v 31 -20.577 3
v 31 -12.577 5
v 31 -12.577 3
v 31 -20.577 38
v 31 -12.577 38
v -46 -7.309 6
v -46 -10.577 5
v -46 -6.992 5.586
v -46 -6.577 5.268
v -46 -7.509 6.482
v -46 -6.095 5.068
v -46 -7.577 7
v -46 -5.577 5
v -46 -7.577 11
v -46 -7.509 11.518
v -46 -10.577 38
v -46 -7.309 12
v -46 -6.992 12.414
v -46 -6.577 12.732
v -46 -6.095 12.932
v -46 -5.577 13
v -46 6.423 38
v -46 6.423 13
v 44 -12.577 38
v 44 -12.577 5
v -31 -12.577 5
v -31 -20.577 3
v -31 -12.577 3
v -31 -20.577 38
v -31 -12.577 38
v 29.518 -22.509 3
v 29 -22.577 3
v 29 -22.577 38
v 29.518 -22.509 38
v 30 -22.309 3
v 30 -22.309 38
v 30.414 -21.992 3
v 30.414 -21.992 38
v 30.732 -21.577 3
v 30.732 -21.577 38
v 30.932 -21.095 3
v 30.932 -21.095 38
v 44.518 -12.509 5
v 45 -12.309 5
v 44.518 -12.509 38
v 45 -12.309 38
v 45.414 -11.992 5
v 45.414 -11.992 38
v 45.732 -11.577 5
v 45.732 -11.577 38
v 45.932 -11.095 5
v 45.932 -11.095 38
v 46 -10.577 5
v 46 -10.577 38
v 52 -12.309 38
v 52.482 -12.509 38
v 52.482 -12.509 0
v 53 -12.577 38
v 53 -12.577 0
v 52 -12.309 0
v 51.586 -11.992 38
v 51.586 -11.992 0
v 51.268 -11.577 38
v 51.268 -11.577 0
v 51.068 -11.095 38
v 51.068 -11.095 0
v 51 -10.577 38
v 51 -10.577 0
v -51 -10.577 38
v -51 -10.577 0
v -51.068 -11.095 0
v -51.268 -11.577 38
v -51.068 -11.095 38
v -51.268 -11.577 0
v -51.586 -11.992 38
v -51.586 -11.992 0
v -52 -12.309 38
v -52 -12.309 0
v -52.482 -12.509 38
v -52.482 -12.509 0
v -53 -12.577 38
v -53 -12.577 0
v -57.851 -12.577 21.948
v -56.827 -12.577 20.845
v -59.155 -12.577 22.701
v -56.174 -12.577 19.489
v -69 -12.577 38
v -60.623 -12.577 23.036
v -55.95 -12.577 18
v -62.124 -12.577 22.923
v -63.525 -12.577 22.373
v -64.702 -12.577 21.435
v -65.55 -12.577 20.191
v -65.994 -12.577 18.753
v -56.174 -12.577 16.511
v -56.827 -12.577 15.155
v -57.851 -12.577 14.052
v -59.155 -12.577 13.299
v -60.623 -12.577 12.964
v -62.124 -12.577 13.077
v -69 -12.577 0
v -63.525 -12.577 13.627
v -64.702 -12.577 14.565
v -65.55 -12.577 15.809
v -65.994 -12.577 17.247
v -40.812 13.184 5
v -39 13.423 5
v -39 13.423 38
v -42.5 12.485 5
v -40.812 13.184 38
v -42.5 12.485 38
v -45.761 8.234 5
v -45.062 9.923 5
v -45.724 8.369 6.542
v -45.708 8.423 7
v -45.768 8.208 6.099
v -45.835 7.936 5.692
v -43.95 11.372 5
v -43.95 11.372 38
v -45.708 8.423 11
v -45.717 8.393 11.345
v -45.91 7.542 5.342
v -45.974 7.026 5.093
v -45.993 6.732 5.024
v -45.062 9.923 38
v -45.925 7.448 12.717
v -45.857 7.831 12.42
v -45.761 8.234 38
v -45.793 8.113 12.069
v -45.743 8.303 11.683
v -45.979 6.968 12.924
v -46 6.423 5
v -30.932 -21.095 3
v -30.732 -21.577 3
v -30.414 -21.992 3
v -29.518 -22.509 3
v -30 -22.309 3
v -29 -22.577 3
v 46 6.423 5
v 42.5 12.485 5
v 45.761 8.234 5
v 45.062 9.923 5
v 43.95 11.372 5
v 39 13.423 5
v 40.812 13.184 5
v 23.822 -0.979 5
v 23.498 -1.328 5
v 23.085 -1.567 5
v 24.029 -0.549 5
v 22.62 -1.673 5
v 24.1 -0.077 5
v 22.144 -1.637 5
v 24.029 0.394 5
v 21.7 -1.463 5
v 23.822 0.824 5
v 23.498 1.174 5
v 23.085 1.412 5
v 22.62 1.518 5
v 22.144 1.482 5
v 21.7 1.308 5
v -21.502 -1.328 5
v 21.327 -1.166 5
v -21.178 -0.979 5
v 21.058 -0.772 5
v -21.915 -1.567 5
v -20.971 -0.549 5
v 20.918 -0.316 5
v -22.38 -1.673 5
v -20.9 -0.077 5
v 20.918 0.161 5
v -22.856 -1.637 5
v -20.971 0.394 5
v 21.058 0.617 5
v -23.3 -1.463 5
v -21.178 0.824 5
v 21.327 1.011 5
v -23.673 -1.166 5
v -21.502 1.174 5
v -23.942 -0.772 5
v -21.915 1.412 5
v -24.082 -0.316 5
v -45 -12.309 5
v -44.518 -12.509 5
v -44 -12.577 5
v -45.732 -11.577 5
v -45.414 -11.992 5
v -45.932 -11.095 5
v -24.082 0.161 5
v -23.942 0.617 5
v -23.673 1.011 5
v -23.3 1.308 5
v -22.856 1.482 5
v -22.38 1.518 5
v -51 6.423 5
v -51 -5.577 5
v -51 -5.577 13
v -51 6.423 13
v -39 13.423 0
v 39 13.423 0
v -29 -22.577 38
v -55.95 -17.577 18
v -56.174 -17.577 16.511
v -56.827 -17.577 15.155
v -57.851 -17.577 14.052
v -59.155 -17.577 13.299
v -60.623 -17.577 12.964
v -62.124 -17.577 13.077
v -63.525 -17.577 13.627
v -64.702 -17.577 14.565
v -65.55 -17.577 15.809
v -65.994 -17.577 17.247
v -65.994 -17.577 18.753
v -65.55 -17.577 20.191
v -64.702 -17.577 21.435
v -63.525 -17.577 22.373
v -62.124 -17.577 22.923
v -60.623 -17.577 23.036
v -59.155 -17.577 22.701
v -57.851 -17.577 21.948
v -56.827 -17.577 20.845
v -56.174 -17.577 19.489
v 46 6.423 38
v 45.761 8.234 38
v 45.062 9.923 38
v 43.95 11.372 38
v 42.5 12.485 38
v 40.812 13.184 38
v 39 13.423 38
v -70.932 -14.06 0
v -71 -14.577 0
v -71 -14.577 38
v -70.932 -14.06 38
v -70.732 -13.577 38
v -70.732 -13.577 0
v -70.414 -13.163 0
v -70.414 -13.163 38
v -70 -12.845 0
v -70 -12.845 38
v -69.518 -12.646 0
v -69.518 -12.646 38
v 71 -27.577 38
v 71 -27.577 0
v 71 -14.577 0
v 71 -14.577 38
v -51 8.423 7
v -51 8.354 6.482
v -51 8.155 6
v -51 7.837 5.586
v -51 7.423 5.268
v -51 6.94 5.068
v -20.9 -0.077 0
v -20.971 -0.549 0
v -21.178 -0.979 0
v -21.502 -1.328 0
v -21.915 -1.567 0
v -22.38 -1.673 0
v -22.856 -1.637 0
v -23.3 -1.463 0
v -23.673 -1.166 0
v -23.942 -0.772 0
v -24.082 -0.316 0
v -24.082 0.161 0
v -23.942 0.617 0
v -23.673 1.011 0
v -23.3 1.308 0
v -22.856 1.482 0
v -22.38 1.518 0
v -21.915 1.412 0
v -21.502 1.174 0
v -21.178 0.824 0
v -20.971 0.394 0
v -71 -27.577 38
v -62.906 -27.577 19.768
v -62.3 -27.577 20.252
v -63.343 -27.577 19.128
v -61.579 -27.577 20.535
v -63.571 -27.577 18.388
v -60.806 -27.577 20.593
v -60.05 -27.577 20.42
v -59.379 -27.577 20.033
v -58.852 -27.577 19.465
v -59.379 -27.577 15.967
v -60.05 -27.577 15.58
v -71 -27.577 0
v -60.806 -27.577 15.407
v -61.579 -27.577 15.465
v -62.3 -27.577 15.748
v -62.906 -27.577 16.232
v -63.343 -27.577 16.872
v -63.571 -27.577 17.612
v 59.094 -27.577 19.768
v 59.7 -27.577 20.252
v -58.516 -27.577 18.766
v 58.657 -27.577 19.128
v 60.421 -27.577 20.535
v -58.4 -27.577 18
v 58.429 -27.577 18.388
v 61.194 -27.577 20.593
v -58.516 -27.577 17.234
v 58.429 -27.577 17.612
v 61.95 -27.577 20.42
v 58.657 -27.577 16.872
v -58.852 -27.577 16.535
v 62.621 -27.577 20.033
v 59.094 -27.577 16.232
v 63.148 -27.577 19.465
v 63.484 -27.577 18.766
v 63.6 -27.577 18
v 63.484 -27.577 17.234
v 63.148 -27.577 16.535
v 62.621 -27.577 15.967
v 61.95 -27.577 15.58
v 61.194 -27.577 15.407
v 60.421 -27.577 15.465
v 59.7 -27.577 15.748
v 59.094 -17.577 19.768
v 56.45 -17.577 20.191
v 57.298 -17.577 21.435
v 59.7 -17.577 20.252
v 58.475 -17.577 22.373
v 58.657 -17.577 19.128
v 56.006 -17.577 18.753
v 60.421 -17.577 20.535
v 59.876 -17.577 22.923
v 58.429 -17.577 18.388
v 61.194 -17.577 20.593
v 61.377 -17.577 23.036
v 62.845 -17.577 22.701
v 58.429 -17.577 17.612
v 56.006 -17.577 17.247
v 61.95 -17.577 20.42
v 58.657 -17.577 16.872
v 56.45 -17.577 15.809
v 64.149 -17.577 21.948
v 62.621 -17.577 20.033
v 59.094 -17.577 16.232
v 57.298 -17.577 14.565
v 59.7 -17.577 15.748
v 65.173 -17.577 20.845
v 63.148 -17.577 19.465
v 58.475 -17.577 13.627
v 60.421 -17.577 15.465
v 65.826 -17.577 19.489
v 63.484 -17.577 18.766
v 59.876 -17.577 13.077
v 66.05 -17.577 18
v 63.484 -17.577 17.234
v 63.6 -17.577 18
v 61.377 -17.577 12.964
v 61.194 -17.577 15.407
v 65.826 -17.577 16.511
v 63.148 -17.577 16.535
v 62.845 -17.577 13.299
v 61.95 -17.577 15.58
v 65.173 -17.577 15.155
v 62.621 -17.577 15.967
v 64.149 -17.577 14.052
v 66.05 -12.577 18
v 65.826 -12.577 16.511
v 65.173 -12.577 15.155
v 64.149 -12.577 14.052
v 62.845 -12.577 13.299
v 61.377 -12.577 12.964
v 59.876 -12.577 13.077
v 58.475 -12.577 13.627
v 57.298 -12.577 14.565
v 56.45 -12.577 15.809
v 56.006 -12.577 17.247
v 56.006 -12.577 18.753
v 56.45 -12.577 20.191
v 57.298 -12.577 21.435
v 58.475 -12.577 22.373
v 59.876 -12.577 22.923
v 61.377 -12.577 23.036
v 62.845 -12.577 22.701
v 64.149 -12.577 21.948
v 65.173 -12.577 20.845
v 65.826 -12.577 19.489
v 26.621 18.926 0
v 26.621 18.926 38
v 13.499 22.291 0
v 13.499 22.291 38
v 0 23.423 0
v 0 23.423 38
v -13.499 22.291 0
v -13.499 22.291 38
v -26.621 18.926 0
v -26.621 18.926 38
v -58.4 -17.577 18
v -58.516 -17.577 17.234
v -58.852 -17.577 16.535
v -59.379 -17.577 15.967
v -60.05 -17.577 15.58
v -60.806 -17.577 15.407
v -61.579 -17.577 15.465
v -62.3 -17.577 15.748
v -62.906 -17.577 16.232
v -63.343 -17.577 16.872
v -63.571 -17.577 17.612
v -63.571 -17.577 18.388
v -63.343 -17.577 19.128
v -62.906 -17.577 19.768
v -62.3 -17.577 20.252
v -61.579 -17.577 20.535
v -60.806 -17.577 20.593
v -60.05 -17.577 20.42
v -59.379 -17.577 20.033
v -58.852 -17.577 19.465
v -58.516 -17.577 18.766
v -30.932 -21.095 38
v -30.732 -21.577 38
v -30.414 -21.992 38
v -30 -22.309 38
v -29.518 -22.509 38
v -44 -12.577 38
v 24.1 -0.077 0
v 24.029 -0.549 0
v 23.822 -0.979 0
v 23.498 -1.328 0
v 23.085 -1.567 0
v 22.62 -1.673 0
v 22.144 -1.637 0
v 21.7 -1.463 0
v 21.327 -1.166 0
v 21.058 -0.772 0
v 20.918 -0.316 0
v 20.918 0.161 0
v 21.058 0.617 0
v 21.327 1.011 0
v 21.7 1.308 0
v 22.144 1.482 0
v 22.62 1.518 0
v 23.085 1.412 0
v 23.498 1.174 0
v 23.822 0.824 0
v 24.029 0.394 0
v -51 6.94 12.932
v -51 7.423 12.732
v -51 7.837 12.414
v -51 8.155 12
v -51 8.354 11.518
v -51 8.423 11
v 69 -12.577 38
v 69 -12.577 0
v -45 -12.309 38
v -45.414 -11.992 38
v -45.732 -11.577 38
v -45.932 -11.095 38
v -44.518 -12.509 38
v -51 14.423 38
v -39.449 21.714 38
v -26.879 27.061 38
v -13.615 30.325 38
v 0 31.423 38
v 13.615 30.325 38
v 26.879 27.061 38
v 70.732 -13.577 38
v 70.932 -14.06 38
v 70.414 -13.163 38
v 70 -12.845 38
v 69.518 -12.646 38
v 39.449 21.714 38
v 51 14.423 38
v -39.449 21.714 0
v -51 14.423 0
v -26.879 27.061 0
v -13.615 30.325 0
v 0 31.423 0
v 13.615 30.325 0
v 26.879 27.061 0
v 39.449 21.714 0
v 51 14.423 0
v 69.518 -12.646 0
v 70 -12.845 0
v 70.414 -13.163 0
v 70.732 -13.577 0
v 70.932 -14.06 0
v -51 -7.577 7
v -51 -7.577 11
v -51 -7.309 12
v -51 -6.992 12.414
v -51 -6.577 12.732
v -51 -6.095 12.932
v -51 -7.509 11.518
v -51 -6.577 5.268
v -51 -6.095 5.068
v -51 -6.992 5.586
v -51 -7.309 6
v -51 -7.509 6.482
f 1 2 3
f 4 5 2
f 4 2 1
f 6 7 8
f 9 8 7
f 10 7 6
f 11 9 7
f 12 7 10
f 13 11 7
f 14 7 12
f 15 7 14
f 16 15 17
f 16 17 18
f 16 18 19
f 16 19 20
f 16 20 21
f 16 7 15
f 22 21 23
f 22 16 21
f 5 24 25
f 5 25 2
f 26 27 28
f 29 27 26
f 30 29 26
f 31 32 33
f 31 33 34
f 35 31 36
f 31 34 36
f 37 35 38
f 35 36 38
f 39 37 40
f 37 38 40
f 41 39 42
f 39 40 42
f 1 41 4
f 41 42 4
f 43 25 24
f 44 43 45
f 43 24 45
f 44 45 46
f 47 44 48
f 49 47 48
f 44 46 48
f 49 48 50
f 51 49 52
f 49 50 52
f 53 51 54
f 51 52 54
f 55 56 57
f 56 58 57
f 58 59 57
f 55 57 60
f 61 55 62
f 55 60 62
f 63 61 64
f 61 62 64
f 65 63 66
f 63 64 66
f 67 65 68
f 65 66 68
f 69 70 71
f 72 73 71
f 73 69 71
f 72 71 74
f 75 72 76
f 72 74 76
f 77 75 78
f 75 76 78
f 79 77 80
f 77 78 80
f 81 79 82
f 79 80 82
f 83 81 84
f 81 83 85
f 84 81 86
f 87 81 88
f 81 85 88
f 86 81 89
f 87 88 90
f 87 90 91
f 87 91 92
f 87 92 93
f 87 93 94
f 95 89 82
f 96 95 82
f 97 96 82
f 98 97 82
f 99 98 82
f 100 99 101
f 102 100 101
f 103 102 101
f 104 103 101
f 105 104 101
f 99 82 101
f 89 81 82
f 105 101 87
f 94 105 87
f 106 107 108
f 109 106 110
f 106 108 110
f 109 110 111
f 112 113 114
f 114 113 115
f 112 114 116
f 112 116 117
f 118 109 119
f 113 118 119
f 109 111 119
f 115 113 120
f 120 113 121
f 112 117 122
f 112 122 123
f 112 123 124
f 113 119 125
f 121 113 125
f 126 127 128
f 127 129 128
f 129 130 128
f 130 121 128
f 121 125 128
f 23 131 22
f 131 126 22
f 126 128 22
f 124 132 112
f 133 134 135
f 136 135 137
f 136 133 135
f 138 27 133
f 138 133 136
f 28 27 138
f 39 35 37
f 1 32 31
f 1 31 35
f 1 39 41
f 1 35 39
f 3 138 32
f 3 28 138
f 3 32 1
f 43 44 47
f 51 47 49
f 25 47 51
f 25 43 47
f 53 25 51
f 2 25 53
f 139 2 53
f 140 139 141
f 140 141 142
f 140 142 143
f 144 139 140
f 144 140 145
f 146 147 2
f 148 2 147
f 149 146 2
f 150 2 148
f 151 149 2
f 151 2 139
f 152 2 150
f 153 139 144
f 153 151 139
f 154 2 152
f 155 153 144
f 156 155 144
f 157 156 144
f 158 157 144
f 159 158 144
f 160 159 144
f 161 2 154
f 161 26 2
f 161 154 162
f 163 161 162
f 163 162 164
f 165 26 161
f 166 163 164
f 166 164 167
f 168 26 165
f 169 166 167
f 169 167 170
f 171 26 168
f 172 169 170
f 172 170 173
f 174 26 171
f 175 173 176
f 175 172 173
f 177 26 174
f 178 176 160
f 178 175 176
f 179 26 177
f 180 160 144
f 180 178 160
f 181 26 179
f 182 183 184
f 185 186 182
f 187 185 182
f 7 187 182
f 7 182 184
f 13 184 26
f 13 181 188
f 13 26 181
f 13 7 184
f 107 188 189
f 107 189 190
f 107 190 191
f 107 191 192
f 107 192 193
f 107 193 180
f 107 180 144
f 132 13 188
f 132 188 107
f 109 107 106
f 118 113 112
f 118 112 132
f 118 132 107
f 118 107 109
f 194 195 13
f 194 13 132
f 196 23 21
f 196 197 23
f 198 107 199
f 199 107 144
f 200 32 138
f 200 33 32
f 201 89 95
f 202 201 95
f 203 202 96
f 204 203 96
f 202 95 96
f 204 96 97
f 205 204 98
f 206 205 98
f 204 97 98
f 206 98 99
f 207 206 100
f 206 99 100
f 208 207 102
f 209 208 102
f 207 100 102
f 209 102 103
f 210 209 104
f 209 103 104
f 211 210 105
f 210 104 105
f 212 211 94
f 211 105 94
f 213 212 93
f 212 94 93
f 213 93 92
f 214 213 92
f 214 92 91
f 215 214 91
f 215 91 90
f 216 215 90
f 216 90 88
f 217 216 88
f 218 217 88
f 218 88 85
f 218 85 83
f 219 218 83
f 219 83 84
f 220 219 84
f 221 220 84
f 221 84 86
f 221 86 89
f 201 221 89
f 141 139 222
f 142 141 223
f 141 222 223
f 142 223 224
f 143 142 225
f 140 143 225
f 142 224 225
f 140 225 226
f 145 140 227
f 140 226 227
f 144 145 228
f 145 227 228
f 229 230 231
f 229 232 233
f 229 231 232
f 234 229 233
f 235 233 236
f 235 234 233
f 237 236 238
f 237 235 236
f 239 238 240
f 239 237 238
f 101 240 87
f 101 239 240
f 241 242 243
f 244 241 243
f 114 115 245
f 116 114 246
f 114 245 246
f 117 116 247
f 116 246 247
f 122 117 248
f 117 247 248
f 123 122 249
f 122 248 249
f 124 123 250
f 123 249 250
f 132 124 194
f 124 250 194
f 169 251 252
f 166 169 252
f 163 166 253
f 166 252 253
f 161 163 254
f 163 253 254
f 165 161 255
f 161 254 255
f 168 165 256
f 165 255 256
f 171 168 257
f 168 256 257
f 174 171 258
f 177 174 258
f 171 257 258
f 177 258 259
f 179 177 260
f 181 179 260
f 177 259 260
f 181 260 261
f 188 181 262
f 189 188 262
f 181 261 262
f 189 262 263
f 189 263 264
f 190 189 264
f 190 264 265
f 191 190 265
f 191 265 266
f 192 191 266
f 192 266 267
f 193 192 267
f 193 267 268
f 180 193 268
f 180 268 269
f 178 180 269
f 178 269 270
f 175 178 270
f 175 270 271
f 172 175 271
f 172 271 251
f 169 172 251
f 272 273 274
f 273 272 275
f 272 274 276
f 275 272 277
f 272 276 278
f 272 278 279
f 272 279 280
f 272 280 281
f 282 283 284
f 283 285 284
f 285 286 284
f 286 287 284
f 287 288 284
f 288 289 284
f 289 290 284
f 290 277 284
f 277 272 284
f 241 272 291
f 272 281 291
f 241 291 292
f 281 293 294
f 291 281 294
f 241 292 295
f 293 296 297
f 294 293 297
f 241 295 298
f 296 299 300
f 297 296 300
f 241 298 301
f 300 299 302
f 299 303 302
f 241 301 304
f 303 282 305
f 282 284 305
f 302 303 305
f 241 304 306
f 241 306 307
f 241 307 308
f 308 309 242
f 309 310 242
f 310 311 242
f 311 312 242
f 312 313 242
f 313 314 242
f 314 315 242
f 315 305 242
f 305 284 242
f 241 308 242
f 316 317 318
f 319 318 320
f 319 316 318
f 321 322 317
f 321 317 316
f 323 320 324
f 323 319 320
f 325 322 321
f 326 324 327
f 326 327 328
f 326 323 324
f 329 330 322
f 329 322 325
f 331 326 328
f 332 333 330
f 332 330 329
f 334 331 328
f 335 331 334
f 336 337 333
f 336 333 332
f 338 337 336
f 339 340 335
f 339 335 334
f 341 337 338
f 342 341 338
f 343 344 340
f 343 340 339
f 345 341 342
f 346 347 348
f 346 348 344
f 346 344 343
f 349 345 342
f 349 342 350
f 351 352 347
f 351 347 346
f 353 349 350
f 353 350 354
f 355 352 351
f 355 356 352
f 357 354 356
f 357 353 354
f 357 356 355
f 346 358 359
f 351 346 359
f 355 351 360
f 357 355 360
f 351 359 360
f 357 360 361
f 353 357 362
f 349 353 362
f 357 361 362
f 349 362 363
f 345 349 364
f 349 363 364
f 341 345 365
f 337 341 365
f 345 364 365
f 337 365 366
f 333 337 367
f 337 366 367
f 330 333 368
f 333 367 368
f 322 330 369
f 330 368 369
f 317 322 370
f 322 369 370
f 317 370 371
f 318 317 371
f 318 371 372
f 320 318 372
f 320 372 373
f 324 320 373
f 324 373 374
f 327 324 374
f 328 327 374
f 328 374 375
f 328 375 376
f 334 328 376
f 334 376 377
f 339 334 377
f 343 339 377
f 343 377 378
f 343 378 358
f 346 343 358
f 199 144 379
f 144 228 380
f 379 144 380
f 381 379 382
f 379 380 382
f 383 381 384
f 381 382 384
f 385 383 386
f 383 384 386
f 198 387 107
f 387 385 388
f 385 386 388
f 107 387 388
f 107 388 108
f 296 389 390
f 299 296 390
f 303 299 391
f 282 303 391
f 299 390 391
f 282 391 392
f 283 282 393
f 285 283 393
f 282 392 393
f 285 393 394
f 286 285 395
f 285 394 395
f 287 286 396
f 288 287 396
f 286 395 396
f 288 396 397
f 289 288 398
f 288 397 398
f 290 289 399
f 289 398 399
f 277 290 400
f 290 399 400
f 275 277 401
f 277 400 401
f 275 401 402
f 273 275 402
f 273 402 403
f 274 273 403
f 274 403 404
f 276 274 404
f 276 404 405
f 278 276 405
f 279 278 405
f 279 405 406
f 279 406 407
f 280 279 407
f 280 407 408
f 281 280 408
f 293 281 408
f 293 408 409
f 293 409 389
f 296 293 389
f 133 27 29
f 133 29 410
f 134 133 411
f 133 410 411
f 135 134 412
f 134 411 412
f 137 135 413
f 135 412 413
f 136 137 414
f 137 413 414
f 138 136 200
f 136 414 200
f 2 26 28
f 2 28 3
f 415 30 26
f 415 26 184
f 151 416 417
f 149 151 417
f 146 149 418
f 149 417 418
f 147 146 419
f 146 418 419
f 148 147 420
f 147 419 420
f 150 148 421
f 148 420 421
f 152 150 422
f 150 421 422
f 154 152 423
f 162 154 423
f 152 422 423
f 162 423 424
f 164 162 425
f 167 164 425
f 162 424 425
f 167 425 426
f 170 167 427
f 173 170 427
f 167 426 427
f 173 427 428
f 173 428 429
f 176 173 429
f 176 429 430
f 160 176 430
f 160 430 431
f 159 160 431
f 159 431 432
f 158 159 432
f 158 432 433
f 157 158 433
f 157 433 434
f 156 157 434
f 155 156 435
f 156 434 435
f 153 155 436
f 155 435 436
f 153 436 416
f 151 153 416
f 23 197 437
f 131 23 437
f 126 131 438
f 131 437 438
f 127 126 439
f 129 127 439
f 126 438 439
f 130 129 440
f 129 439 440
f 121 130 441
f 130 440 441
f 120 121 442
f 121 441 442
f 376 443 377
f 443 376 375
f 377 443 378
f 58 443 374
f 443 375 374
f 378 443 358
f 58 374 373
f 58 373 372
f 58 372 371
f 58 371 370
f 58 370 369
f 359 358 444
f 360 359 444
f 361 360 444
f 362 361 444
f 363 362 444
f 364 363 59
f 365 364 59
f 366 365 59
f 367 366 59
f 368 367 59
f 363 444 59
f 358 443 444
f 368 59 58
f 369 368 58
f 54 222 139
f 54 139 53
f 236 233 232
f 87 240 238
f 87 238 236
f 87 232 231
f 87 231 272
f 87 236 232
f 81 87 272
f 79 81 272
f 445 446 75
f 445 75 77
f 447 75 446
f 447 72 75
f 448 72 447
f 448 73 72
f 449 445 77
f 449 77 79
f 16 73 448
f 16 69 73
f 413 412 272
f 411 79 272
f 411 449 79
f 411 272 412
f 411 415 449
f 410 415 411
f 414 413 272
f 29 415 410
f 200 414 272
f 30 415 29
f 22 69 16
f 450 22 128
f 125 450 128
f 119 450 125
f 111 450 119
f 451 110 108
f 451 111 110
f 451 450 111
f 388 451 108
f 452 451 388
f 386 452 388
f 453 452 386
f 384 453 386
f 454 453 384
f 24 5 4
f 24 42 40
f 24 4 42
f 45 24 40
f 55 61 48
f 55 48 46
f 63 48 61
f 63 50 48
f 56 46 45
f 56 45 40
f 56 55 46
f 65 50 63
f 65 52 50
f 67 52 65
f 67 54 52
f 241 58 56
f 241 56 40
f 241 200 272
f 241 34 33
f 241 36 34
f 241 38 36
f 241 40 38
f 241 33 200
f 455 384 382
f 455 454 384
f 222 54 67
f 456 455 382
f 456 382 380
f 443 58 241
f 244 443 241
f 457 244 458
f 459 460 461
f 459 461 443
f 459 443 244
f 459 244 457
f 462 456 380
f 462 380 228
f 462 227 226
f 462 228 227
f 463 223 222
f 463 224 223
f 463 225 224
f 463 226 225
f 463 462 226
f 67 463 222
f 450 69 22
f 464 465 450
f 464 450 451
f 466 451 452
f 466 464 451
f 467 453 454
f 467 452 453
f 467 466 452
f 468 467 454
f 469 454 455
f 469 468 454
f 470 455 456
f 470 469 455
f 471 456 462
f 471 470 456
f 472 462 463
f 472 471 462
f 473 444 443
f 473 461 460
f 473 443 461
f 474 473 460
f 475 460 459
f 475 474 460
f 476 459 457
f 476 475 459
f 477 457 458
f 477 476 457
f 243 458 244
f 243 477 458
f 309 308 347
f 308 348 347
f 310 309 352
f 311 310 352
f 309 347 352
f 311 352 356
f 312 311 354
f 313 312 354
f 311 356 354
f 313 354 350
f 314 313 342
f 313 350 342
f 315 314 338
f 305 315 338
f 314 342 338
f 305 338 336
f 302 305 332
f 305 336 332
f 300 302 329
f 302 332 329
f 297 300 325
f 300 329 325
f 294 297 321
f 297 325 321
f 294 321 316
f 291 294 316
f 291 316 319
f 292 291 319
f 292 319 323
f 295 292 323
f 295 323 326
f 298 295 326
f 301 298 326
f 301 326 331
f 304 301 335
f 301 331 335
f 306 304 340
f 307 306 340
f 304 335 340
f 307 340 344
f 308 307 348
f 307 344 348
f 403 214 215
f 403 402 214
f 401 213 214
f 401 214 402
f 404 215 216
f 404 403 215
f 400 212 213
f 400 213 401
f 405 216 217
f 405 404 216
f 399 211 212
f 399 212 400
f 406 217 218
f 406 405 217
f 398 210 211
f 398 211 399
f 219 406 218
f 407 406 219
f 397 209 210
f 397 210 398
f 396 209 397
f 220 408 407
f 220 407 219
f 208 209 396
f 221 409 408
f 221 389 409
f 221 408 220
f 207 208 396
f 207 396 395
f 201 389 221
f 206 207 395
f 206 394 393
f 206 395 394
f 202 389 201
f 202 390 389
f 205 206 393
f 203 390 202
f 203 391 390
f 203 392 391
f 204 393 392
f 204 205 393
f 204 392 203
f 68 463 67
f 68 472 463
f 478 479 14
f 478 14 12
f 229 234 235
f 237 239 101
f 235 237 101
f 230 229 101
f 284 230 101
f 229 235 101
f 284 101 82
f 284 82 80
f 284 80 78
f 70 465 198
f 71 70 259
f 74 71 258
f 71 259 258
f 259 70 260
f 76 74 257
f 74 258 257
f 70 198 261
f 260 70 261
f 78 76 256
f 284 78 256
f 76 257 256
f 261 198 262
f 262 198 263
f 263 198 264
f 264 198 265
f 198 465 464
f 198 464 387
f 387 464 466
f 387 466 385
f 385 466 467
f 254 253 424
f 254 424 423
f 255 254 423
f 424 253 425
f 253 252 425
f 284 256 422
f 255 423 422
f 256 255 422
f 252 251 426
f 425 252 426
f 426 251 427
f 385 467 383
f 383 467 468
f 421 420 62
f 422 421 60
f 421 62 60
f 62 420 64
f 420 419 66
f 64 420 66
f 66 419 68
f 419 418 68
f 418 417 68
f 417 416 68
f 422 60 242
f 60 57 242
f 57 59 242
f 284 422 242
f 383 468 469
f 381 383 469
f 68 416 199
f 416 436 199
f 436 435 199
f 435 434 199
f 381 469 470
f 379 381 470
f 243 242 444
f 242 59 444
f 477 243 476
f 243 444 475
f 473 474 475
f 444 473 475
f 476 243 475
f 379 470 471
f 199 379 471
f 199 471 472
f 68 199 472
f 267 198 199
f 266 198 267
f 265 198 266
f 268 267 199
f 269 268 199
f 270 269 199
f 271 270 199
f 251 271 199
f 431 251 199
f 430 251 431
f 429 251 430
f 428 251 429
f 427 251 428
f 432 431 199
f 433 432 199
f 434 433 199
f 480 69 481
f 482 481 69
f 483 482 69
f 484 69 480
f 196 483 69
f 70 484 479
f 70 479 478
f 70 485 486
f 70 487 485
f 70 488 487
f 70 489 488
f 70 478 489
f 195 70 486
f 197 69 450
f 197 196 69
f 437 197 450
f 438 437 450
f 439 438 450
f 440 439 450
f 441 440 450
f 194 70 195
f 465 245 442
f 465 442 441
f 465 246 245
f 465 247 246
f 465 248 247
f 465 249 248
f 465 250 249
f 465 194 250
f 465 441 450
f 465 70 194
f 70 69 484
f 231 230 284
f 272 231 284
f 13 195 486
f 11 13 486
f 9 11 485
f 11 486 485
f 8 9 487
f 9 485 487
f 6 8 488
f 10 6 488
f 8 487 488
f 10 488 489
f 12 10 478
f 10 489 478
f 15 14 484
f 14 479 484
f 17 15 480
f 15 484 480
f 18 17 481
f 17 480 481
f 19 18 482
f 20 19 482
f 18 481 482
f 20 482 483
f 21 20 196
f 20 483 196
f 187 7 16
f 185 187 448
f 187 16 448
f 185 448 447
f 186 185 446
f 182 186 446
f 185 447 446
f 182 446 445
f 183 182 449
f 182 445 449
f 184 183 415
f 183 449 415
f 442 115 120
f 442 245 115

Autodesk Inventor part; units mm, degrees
ref_plane "YZ Plane" through (0, 0, 0) normal (1, 0, 0) x (0, 1, 0)
ref_plane "XZ Plane" through (0, 0, 0) normal (0, 1, 0) x (-1, 0, 0)
ref_plane "XY Plane" through (0, 0, 0) normal (0, 0, 1) x (1, 0, 0)
sketch "スケッチ1" plane through (0, 0, 0) normal (0, 0, 1) x (1, 0, 0)
  line L0 (51, 14.4226) -> (51, -10.5774)
  line L1 (-51, -10.5774) -> (-51, 14.4226)
  circle A0 centre (-22.5, -0.0774) radius 1.6
  circle A1 centre (22.5, -0.0774) radius 1.6
  line L2 (-71, -27.5774) -> (71, -27.5774)
  line L3 (71, -27.5774) -> (71, -14.5774)
  line L4 (-53, -12.5774) -> (-69, -12.5774)
  line L5 (-71, -14.5774) -> (-71, -27.5774)
  arc A2 (-53, -12.5774) -> (-51, -10.5774) centre (-53, -10.5774) ccw
  line L6 (69, -12.5774) -> (53, -12.5774)
  arc A3 (51, -10.5774) -> (53, -12.5774) centre (53, -10.5774) ccw
  line L7 (-51, 14.4226) -> (51, 14.4226)
  arc A4 (-69, -12.5774) -> (-71, -14.5774) centre (-69, -14.5774) ccw
  arc A5 (71, -14.5774) -> (69, -12.5774) centre (69, -14.5774) ccw
  arc A6 (51, 14.4226) -> (-51, 14.4226) centre (0, -53.5774) ccw
  point P0 (0, 0)
  point P1 (0, -100)
  point P2 (71, -12.5774)
  point P3 (-71, -12.5774)
  point P4 (0, 31.4226)
  dimension "d5" = 51
  dimension "d8" = 3.2
  dimension "d10" = 3.2
  dimension "d28" = 45
  dimension "d31" = 28.5
  dimension "d35" = 142
  dimension "d36" = 15
  dimension "d38" = 2
  dimension "d39" = 2
  dimension "d42" = 20
  dimension "d47" = 100
  dimension "d48" = 51
  dimension "d55" = 102
  dimension "d56" = 42
  dimension "d57" = 2
  dimension "d58" = 2
  dimension "d73" = 27.5
  dimension "d75" = 27.5
  dimension "d76" = 17
  dimension "d86" = 20
extrude "押し出し1" add sketch "スケッチ1" along normal blind 38
sketch "スケッチ2" plane through (0, 0, 38) normal (0, 0, 1) x (1, 0, 0)
  line L0 (-39, 13.4226) -> (39, 13.4226)
  line L1 (46, 6.4226) -> (46, -10.5774)
  line L2 (44, -12.5774) -> (-44, -12.5774)
  line L3 (-46, -10.5774) -> (-46, 6.4226)
  arc A0 (-39, 13.4226) -> (-46, 6.4226) centre (-39, 6.4226) ccw
  arc A1 (46, 6.4226) -> (39, 13.4226) centre (39, 6.4226) ccw
  arc A2 (-46, -10.5774) -> (-44, -12.5774) centre (-44, -10.5774) ccw
  arc A3 (44, -12.5774) -> (46, -10.5774) centre (44, -10.5774) ccw
  circle A4 centre (22.5, -0.0774) radius 1.6 projected
  point P0 (0, 0)
  point P1 (-46, 13.4226)
  point P2 (46, -12.5774)
  point P3 (46, 13.4226)
  point P4 (-46, -12.5774)
  dimension "d17" = 92
  dimension "d18" = 26
  dimension "d19" = 46
  dimension "d23" = 7
  dimension "d24" = 7
  dimension "d25" = 2
  dimension "d26" = 2
  dimension "d50" = 12.5
extrude "押し出し2" cut sketch "スケッチ2" against normal blind 33 contours L0 A1 L1 A3 L2 A2 L3 A0 | A4
sketch "スケッチ3" plane through (0, 0, 38) normal (0, 0, 1) x (1, 0, 0)
  line L0 (-39, 13.4226) -> (39, 13.4226) projected
  arc A0 (39, 13.4226) -> (-39, 13.4226) centre (0, -57.6274) ccw
  line L1 (-46, -10.5774) -> (-46, 6.4226) projected
  line L2 (44, -12.5774) -> (-44, -12.5774) projected
  line L3 (-39, 13.4226) -> (39, 13.4226)
  point P0 (0, 0)
  point P1 (0, 23.4226)
  dimension "d59" = 10
extrude "押し出し3" cut sketch "スケッチ3" against normal blind 40
sketch "スケッチ4" plane through (0, 0, 38) normal (0, 0, 1) x (1, 0, 0)
  line L0 (-31, -12.5774) -> (31, -12.5774)
  line L1 (31, -12.5774) -> (31, -20.5774)
  line L2 (29, -22.5774) -> (-29, -22.5774)
  line L3 (-31, -20.5774) -> (-31, -12.5774)
  line L4 (-46, -10.5774) -> (-46, 6.4226) projected
  line L5 (44, -12.5774) -> (-44, -12.5774) projected
  arc A0 (-31, -20.5774) -> (-29, -22.5774) centre (-29, -20.5774) ccw
  arc A1 (29, -22.5774) -> (31, -20.5774) centre (29, -20.5774) ccw
  point P0 (0, 0)
  point P1 (31, -22.5774)
  point P2 (-31, -22.5774)
  dimension "d66" = 62
  dimension "d67" = 10
  dimension "d68" = 15
  dimension "d69" = 10
  dimension "d72" = 2
extrude "押し出し4" cut sketch "スケッチ4" against normal blind 35
sketch "スケッチ5" plane through (-69, -12.5774, 0) normal (0, 1, 0) x (1, 0, 0)
  circle A0 centre (8, -18) radius 5.05
  line L0 (69, 0) -> (69, -40)
  circle A1 centre (130, -18) radius 5.05
  line L1 (18, 0) -> (18, -38) projected
  line L2 (16, -38) -> (0, -38) projected
  point P0 (-2, -38)
  dimension "d77" = 10.1
  dimension "d84" = 10
  dimension "d85" = 20
extrude "押し出し5" cut sketch "スケッチ5" against normal blind 5
sketch "スケッチ6" plane through (-61, -17.5774, 18) normal (0, 1, 0) x (1, 0, 0)
  line L0 (61, 18) -> (61, -20)
  line L1 (90, -20) -> (32, -20) projected
  circle A0 centre (0, 0) radius 2.6
  circle A1 centre (122, 0) radius 2.6
  line L2 (10, 18) -> (10, -20) projected
  line L3 (8, -20) -> (-8, -20) projected
  dimension "d81" = 5.2
  dimension "d87" = 10
  dimension "d88" = 20
extrude "押し出し6" cut sketch "スケッチ6" against normal blind 10
sketch "スケッチ7" plane through (-51, -10.5774, 0) normal (-1, 0, 0) x (0, 0, 1)
  line L0 (7, 19) -> (11, 19)
  line L1 (13, 17) -> (13, 5)
  line L2 (11, 3) -> (7, 3)
  line L3 (5, 5) -> (5, 17)
  arc A0 (7, 19) -> (5, 17) centre (7, 17) ccw
  arc A1 (5, 5) -> (7, 3) centre (7, 5) ccw
  arc A2 (11, 3) -> (13, 5) centre (11, 5) ccw
  arc A3 (13, 17) -> (11, 19) centre (11, 17) ccw
  line L4 (0, 25) -> (0, 0) projected
  point P0 (0, 10.5774)
  point P1 (13, 3)
  point P2 (13, 19)
  point P3 (5, 3)
  point P4 (38, -2)
  dimension "d89" = 8
  dimension "d90" = 16
  dimension "d91" = 2
  dimension "d94" = 5
  dimension "d95" = 5
extrude "押し出し7" cut sketch "スケッチ7" against normal blind 8
properties part number "jig"
